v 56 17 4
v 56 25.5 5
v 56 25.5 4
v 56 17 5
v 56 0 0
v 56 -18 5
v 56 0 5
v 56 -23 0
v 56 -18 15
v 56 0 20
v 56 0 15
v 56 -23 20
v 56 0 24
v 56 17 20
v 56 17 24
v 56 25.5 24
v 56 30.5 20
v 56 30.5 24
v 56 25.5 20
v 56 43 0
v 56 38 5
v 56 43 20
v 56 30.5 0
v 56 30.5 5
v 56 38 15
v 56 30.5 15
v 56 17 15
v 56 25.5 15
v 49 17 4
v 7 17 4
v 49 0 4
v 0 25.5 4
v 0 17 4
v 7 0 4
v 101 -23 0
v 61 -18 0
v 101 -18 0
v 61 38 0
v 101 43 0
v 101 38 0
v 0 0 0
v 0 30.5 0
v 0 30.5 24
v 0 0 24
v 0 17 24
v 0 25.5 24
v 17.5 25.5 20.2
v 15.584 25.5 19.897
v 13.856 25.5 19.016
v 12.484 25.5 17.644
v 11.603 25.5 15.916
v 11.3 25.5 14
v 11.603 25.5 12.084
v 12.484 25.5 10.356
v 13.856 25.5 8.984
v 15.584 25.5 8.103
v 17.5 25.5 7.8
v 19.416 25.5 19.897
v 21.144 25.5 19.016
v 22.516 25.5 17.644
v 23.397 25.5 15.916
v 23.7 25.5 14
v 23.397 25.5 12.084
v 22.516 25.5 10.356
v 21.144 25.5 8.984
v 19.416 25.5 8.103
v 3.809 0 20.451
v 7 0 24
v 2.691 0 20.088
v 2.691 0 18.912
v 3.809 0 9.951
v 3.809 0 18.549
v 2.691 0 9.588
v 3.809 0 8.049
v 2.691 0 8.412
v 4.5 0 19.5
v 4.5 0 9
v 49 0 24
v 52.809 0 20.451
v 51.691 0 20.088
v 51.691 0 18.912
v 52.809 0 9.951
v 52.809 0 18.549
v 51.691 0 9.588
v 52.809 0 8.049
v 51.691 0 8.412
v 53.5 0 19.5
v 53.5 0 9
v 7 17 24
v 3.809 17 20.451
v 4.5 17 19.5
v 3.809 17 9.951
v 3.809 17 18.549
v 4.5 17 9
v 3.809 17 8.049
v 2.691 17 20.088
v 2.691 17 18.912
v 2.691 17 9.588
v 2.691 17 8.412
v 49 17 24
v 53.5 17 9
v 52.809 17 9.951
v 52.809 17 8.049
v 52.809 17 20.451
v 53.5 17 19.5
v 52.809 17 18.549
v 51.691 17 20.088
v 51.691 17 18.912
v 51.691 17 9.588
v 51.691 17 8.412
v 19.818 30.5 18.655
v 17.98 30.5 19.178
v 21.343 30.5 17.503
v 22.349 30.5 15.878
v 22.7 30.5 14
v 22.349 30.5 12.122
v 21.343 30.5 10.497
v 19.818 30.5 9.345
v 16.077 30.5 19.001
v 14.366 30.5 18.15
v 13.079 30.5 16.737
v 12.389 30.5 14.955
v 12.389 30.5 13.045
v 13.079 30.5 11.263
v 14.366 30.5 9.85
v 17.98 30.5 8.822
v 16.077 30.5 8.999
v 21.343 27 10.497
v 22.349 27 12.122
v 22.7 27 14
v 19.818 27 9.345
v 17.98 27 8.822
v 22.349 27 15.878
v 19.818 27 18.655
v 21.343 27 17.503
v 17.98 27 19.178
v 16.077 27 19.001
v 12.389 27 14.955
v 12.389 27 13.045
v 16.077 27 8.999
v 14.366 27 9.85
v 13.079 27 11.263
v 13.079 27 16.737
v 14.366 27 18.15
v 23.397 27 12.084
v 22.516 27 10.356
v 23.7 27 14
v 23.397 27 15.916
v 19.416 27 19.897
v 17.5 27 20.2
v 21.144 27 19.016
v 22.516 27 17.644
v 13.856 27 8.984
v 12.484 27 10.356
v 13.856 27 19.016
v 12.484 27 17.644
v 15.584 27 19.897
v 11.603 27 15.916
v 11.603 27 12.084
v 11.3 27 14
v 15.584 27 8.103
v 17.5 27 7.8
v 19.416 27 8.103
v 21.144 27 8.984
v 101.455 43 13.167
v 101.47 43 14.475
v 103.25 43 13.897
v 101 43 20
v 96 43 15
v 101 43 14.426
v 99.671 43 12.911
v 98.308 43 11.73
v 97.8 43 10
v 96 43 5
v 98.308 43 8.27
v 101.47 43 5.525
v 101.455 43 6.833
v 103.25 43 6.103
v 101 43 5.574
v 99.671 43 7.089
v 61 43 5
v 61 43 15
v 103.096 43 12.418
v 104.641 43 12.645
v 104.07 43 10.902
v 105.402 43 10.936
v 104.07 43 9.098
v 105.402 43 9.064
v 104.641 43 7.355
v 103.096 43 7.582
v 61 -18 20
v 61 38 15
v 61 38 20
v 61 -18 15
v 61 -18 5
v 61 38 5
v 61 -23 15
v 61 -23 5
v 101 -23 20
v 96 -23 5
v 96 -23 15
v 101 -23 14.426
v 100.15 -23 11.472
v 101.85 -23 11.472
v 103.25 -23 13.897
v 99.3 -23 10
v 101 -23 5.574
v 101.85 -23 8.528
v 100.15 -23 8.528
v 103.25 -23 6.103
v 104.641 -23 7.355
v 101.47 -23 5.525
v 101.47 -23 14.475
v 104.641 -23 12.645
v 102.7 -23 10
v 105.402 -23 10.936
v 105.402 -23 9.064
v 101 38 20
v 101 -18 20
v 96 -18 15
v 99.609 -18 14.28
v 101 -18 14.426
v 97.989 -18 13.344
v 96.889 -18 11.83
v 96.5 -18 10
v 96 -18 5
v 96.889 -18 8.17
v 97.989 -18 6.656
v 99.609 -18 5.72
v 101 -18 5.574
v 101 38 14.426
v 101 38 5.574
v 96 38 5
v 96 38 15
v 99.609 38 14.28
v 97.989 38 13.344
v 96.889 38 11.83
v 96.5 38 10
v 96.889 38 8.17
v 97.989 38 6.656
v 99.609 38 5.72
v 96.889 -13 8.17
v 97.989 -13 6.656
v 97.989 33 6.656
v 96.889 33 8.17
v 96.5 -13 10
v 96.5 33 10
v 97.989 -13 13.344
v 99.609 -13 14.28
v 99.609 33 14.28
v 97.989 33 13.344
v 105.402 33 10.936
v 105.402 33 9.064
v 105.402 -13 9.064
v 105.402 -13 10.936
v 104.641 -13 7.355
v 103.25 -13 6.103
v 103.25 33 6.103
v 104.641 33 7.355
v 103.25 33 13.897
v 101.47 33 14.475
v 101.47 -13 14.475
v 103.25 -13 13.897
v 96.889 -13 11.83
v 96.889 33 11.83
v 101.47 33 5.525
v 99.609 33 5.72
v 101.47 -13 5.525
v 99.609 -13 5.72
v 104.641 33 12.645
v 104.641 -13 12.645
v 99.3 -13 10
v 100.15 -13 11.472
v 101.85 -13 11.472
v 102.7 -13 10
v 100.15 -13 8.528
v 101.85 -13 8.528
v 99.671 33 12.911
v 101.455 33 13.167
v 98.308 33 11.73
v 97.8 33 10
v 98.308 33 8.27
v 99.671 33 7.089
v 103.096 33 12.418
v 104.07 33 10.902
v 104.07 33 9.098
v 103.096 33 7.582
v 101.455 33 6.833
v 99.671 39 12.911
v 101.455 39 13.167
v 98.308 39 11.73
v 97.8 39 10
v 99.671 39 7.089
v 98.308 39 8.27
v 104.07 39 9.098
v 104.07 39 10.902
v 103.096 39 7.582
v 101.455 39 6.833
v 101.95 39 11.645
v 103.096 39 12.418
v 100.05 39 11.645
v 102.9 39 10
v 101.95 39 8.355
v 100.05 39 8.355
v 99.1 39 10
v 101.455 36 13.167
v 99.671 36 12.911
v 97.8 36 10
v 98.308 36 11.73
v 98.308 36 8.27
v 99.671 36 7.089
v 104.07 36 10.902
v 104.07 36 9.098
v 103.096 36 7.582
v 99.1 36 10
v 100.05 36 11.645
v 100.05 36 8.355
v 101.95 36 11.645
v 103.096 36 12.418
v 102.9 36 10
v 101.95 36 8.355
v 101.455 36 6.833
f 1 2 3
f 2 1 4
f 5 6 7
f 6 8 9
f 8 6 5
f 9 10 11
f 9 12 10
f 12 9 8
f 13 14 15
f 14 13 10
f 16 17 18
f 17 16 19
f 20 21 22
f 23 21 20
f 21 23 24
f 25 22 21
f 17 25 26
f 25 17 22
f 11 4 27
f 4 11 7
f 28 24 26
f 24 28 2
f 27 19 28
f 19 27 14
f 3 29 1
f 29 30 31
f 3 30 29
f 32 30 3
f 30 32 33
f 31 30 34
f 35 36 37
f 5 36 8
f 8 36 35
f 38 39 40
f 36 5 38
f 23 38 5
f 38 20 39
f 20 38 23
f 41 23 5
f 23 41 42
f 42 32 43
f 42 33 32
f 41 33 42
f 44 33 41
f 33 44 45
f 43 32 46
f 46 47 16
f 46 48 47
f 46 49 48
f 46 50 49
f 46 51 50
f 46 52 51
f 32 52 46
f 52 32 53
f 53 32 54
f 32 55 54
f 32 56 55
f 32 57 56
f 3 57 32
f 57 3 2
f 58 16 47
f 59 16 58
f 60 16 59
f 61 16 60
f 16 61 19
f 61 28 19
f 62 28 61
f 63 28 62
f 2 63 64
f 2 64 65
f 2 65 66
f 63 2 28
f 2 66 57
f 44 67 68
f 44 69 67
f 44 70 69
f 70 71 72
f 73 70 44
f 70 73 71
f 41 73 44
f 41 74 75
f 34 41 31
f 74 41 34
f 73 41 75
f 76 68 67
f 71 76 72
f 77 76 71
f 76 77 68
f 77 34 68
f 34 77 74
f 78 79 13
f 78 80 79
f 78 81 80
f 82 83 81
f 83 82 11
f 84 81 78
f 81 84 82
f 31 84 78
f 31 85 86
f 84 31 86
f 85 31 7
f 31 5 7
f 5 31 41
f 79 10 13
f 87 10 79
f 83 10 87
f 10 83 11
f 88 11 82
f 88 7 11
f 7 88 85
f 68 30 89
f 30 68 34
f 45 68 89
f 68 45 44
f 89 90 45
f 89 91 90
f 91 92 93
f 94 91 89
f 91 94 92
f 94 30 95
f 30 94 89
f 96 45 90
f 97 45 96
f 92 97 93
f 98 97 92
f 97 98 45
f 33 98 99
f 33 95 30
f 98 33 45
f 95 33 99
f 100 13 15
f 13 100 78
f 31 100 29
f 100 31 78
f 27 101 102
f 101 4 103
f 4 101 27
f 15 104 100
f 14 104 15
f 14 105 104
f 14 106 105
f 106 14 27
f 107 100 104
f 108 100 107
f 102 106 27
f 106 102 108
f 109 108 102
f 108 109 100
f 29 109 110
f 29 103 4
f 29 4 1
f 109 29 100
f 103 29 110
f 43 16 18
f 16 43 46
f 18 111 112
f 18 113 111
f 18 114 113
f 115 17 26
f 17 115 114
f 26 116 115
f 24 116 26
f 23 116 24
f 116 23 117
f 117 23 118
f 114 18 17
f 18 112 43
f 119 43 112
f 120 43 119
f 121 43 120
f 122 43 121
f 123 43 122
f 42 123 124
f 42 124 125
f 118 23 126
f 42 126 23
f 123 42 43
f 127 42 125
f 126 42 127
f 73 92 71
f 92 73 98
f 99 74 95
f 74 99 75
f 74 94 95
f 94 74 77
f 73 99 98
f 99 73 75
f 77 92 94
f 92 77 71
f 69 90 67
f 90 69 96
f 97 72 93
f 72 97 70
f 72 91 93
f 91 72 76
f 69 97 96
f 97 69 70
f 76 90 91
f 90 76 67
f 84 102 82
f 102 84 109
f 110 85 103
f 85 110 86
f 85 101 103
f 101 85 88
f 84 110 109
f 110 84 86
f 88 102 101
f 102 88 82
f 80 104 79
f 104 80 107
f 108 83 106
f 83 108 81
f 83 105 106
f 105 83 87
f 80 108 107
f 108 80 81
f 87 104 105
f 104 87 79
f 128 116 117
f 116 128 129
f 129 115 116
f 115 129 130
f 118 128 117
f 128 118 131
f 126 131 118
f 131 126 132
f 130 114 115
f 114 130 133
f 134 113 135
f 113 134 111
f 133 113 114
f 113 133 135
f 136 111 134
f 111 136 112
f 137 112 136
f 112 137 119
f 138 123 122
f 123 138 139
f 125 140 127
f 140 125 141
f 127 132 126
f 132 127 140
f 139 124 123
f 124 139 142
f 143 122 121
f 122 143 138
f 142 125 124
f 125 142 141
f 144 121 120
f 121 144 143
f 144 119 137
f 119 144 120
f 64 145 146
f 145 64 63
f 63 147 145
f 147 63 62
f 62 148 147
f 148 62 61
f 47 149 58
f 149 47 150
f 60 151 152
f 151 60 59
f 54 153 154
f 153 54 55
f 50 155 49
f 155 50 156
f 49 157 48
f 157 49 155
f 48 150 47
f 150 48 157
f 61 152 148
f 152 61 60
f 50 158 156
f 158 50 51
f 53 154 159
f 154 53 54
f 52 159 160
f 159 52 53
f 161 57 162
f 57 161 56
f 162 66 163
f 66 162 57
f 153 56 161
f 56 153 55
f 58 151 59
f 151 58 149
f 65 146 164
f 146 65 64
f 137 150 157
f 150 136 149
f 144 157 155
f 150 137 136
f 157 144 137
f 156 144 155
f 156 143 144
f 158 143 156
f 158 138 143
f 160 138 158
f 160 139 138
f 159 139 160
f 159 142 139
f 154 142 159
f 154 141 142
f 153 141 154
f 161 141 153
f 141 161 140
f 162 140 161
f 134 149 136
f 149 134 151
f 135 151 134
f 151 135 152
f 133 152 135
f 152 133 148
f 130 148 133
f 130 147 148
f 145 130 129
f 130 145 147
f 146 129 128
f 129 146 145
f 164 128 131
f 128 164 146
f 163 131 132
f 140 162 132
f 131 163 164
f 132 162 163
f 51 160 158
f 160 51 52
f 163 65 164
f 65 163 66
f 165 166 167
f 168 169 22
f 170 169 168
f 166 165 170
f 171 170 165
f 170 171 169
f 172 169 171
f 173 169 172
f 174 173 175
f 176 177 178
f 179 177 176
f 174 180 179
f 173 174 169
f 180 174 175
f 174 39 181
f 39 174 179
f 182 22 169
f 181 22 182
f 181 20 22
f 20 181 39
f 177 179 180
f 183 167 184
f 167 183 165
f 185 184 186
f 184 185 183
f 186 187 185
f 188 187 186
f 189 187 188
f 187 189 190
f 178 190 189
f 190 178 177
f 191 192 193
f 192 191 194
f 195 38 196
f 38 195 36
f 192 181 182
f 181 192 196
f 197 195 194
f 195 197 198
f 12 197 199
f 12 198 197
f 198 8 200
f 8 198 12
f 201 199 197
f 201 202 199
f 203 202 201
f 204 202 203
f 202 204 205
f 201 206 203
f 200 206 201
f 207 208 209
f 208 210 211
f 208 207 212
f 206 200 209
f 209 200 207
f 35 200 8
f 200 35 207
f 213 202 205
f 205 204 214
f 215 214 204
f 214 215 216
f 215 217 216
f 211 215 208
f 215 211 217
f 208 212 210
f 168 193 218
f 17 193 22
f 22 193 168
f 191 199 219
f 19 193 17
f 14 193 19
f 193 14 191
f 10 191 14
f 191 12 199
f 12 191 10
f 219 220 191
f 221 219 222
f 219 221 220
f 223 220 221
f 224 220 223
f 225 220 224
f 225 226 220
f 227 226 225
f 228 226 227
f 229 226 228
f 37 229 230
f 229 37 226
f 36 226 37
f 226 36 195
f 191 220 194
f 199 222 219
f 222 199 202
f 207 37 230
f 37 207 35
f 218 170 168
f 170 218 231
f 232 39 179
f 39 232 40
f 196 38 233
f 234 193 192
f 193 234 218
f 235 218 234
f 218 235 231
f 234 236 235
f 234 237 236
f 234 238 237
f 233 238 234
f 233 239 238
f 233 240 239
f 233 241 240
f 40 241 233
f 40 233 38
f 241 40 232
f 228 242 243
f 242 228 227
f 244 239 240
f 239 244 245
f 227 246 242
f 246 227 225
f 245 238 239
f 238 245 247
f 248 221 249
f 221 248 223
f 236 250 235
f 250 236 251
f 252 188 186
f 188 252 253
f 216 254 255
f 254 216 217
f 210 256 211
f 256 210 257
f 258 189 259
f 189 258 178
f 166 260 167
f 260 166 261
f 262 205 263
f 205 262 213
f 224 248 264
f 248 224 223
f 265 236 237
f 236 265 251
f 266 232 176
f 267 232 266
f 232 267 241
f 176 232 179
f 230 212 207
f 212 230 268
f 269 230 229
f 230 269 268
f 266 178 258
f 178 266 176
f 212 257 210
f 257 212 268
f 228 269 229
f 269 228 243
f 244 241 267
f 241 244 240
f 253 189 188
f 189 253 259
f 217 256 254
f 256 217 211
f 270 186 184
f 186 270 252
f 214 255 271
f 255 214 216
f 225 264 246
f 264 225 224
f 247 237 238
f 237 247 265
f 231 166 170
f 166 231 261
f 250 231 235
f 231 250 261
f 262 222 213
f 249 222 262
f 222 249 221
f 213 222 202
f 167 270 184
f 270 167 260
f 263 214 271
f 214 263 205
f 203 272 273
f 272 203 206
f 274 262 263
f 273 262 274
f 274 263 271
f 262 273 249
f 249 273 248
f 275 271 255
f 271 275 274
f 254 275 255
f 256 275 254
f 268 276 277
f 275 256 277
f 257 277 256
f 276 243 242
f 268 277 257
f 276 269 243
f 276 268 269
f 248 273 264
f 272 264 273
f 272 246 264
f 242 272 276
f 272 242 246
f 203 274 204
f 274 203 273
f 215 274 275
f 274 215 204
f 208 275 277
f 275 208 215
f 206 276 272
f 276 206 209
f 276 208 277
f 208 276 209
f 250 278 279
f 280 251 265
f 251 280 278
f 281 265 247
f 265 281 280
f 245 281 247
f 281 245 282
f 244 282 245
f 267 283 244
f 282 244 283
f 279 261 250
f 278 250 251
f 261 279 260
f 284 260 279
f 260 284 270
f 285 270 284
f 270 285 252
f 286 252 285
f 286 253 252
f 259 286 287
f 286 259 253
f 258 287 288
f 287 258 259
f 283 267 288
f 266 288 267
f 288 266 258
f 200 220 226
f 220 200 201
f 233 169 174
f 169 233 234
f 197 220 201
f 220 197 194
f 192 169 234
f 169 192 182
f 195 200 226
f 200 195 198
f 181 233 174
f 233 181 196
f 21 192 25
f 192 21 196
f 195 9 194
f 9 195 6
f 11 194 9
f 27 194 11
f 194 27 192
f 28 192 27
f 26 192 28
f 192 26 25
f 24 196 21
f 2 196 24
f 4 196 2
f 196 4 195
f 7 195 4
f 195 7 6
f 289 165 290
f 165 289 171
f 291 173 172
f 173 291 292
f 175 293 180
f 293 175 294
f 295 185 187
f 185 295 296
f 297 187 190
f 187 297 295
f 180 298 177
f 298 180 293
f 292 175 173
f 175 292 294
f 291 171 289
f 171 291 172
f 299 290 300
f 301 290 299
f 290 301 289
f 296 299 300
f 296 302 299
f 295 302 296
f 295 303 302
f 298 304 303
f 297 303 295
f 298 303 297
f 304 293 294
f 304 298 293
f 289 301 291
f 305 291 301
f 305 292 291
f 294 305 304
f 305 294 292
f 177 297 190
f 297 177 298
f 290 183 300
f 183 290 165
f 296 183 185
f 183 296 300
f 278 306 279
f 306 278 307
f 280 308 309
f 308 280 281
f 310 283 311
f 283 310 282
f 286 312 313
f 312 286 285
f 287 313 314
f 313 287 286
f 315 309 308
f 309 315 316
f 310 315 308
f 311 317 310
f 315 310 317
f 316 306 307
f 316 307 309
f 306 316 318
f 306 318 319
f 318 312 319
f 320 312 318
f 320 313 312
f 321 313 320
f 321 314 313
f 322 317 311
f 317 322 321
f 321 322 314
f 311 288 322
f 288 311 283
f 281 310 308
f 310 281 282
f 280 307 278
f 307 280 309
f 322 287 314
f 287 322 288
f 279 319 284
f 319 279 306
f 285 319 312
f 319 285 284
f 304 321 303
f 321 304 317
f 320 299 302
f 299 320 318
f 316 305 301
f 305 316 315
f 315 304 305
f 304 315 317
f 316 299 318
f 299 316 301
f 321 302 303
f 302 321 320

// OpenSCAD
// file: serv_box_2.scad
motor_w = 46;//底部。
leg_w = 20;
leg_h = 5;
leg_l = motor_w+20;
//设置墙高度
wall_h = 40;
module serv_box_2(){
    difference(){
        
        union(){
             cube(size=[leg_l,leg_w,leg_h]);

            //left
            translate([0,0,leg_h]) cube(size=[leg_h,leg_w,wall_h]);
            //right
            translate([leg_l-leg_h,0,leg_h]) cube(size=[leg_h,leg_w,wall_h]);
            //中间滚轴
            translate([leg_l,leg_w/2,wall_h+leg_h]) rotate(a=[180,90,0]) cylinder(h=leg_l,d=9);//2.88

        }
        //螺丝孔
        translate([0,leg_w/2,wall_h+leg_h]) rotate(a=[0,90,0]) cylinder(h=10,d=2.9+0.5);//2.88微调0.5
        //舵机孔
        //截取中间舵机
        translate([leg_l/2,leg_w/2,wall_h+leg_h]) cube(size=[motor_w,20,20],center=true);
        //侧面挖空
        translate([0,leg_w/4,leg_h]) cube(size=[leg_l,leg_w/2,wall_h-5]);
        //底部挖空
        translate([leg_h,leg_w/4,0]) cube(size=[leg_l-leg_h*2,leg_w/2,wall_h-5]);
        //往里面挖 4mm 螺丝洞
        translate([leg_l-4,leg_w/2,wall_h+leg_h]) rotate(a=[0,90,0]) cylinder(h=4,d=5.9+0.5);//5.88//微调0.4
    //    //挖 3mm 舵机轴。
        translate([leg_l-10,leg_w/2,wall_h+leg_h]) rotate(a=[0,90,0]) cylinder(h=3,d=5.9+0.5);//5.88//微调0.4
        //螺丝口固定舵机
        translate([leg_l-10,leg_w/2,wall_h+leg_h]) rotate(a=[0,90,0]) cylinder(h=10,d=3.8);//3.8
    }
}
// file: serv_box_1.scad
floor_l = 55+1;//len有误差，长度增加1.
floor_w = 17;//width
floor_h = 4;//height
wall_l = 7;//len
wall_h = 20;//height

back_wall = 8.5;
back_wall_w = 5;

//螺丝圆柱体
module screw(){
    screw_w = 2;
    rotate(a=[270,0,0]) cylinder(h=floor_w,d=screw_w);
}

//挖螺丝孔
module screw_hole(){
    //去掉螺丝孔
    //左侧
    translate([3.5,0,floor_h+5]) screw();
    translate([3.5,0,floor_h+5+10.5]) screw();
    //右侧
    translate([floor_l-3.5,0,floor_h+5]) screw();
    translate([floor_l-3.5,0,floor_h+5+10.5]) screw();
}

//法兰盘卡槽。
module flange_hole(){
    //法兰盘卡槽。
    flange_w = floor_w+back_wall;
    translate([17.5,0,floor_h+wall_h/2]) rotate(a=[270,0,0])  cylinder(h=flange_w+100,d=10.4);
    translate([17.5,0,floor_h+wall_h/2]) rotate(a=[270,0,0]) cylinder(h=flange_w+1.5,d=12.4);
}

module serv_box_1(){
    difference(){
        union(){
            //设置底座。
            cube(size=[floor_l,floor_w+back_wall,floor_h]);
            //设置左侧，放在底座上面。
            translate([0,0,floor_h]) cube(size=[wall_l,floor_w,wall_h]);
            //设置右侧，放在底座上面。
            translate([floor_l - wall_l ,0,floor_h]) cube(size=[wall_l,floor_w,wall_h]);
            //设置顶部
            //translate([0,0,wall_h+floor_h]) cube(size=[floor_l,floor_w,floor_h]);
            //设置侧面
            translate([0,floor_w++back_wall,0]) cube(size=[floor_l,back_wall_w,wall_h+floor_h]);
        }
        union(){
            //挖螺丝孔
            screw_hole()
            //底部挖空减轻重量
            translate([10,5,0]) cube(size=[floor_l-20,floor_w+back_wall_w-5,wall_h+floor_h*2]);

            //法兰盘卡槽。不在这里挖洞。
            //flange_hole();
        }
    }
}
//for test.
//serv_box_1();
// main file
//使用use，重复利用模型，不需要每次都画。
use <serv_box_1.scad>;
use <serv_box_2.scad>;
motor_l = 55+1;
motor_w = 24;

module serv_hole_a(){
    difference(){
        tmp_l = 10;
        translate([tmp_l/2,0,0]) rotate(a=[180,90,0]) cube([12,serv_w,tmp_l],center=true);
        //往里面挖 4mm 螺丝洞
        translate([tmp_l-4,0,0]) rotate(a=[0,90,0]) cylinder(h=4,d=5.9+0.5);//5.88//微调0.4
        //挖 3mm 舵机轴。
        translate([tmp_l-10,0,0]) rotate(a=[0,90,0]) cylinder(h=3,d=5.9+0.5);//5.88//微调0.4
        //螺丝口固定舵机
        translate([tmp_l-10,0,0]) rotate(a=[0,90,0]) cylinder(h=10,d=3.8);//3.8
    }
}

module box1(){
    difference(){
        //调用之前的舵机支架。移动到中心。
        serv_box_1();
        //挖去法兰盘洞。
        flange_hole();
    }
}

union(){
    box1();
    //
    translate([motor_l,-23,0]) rotate(a=[90,0,90]) serv_box_2();
}
